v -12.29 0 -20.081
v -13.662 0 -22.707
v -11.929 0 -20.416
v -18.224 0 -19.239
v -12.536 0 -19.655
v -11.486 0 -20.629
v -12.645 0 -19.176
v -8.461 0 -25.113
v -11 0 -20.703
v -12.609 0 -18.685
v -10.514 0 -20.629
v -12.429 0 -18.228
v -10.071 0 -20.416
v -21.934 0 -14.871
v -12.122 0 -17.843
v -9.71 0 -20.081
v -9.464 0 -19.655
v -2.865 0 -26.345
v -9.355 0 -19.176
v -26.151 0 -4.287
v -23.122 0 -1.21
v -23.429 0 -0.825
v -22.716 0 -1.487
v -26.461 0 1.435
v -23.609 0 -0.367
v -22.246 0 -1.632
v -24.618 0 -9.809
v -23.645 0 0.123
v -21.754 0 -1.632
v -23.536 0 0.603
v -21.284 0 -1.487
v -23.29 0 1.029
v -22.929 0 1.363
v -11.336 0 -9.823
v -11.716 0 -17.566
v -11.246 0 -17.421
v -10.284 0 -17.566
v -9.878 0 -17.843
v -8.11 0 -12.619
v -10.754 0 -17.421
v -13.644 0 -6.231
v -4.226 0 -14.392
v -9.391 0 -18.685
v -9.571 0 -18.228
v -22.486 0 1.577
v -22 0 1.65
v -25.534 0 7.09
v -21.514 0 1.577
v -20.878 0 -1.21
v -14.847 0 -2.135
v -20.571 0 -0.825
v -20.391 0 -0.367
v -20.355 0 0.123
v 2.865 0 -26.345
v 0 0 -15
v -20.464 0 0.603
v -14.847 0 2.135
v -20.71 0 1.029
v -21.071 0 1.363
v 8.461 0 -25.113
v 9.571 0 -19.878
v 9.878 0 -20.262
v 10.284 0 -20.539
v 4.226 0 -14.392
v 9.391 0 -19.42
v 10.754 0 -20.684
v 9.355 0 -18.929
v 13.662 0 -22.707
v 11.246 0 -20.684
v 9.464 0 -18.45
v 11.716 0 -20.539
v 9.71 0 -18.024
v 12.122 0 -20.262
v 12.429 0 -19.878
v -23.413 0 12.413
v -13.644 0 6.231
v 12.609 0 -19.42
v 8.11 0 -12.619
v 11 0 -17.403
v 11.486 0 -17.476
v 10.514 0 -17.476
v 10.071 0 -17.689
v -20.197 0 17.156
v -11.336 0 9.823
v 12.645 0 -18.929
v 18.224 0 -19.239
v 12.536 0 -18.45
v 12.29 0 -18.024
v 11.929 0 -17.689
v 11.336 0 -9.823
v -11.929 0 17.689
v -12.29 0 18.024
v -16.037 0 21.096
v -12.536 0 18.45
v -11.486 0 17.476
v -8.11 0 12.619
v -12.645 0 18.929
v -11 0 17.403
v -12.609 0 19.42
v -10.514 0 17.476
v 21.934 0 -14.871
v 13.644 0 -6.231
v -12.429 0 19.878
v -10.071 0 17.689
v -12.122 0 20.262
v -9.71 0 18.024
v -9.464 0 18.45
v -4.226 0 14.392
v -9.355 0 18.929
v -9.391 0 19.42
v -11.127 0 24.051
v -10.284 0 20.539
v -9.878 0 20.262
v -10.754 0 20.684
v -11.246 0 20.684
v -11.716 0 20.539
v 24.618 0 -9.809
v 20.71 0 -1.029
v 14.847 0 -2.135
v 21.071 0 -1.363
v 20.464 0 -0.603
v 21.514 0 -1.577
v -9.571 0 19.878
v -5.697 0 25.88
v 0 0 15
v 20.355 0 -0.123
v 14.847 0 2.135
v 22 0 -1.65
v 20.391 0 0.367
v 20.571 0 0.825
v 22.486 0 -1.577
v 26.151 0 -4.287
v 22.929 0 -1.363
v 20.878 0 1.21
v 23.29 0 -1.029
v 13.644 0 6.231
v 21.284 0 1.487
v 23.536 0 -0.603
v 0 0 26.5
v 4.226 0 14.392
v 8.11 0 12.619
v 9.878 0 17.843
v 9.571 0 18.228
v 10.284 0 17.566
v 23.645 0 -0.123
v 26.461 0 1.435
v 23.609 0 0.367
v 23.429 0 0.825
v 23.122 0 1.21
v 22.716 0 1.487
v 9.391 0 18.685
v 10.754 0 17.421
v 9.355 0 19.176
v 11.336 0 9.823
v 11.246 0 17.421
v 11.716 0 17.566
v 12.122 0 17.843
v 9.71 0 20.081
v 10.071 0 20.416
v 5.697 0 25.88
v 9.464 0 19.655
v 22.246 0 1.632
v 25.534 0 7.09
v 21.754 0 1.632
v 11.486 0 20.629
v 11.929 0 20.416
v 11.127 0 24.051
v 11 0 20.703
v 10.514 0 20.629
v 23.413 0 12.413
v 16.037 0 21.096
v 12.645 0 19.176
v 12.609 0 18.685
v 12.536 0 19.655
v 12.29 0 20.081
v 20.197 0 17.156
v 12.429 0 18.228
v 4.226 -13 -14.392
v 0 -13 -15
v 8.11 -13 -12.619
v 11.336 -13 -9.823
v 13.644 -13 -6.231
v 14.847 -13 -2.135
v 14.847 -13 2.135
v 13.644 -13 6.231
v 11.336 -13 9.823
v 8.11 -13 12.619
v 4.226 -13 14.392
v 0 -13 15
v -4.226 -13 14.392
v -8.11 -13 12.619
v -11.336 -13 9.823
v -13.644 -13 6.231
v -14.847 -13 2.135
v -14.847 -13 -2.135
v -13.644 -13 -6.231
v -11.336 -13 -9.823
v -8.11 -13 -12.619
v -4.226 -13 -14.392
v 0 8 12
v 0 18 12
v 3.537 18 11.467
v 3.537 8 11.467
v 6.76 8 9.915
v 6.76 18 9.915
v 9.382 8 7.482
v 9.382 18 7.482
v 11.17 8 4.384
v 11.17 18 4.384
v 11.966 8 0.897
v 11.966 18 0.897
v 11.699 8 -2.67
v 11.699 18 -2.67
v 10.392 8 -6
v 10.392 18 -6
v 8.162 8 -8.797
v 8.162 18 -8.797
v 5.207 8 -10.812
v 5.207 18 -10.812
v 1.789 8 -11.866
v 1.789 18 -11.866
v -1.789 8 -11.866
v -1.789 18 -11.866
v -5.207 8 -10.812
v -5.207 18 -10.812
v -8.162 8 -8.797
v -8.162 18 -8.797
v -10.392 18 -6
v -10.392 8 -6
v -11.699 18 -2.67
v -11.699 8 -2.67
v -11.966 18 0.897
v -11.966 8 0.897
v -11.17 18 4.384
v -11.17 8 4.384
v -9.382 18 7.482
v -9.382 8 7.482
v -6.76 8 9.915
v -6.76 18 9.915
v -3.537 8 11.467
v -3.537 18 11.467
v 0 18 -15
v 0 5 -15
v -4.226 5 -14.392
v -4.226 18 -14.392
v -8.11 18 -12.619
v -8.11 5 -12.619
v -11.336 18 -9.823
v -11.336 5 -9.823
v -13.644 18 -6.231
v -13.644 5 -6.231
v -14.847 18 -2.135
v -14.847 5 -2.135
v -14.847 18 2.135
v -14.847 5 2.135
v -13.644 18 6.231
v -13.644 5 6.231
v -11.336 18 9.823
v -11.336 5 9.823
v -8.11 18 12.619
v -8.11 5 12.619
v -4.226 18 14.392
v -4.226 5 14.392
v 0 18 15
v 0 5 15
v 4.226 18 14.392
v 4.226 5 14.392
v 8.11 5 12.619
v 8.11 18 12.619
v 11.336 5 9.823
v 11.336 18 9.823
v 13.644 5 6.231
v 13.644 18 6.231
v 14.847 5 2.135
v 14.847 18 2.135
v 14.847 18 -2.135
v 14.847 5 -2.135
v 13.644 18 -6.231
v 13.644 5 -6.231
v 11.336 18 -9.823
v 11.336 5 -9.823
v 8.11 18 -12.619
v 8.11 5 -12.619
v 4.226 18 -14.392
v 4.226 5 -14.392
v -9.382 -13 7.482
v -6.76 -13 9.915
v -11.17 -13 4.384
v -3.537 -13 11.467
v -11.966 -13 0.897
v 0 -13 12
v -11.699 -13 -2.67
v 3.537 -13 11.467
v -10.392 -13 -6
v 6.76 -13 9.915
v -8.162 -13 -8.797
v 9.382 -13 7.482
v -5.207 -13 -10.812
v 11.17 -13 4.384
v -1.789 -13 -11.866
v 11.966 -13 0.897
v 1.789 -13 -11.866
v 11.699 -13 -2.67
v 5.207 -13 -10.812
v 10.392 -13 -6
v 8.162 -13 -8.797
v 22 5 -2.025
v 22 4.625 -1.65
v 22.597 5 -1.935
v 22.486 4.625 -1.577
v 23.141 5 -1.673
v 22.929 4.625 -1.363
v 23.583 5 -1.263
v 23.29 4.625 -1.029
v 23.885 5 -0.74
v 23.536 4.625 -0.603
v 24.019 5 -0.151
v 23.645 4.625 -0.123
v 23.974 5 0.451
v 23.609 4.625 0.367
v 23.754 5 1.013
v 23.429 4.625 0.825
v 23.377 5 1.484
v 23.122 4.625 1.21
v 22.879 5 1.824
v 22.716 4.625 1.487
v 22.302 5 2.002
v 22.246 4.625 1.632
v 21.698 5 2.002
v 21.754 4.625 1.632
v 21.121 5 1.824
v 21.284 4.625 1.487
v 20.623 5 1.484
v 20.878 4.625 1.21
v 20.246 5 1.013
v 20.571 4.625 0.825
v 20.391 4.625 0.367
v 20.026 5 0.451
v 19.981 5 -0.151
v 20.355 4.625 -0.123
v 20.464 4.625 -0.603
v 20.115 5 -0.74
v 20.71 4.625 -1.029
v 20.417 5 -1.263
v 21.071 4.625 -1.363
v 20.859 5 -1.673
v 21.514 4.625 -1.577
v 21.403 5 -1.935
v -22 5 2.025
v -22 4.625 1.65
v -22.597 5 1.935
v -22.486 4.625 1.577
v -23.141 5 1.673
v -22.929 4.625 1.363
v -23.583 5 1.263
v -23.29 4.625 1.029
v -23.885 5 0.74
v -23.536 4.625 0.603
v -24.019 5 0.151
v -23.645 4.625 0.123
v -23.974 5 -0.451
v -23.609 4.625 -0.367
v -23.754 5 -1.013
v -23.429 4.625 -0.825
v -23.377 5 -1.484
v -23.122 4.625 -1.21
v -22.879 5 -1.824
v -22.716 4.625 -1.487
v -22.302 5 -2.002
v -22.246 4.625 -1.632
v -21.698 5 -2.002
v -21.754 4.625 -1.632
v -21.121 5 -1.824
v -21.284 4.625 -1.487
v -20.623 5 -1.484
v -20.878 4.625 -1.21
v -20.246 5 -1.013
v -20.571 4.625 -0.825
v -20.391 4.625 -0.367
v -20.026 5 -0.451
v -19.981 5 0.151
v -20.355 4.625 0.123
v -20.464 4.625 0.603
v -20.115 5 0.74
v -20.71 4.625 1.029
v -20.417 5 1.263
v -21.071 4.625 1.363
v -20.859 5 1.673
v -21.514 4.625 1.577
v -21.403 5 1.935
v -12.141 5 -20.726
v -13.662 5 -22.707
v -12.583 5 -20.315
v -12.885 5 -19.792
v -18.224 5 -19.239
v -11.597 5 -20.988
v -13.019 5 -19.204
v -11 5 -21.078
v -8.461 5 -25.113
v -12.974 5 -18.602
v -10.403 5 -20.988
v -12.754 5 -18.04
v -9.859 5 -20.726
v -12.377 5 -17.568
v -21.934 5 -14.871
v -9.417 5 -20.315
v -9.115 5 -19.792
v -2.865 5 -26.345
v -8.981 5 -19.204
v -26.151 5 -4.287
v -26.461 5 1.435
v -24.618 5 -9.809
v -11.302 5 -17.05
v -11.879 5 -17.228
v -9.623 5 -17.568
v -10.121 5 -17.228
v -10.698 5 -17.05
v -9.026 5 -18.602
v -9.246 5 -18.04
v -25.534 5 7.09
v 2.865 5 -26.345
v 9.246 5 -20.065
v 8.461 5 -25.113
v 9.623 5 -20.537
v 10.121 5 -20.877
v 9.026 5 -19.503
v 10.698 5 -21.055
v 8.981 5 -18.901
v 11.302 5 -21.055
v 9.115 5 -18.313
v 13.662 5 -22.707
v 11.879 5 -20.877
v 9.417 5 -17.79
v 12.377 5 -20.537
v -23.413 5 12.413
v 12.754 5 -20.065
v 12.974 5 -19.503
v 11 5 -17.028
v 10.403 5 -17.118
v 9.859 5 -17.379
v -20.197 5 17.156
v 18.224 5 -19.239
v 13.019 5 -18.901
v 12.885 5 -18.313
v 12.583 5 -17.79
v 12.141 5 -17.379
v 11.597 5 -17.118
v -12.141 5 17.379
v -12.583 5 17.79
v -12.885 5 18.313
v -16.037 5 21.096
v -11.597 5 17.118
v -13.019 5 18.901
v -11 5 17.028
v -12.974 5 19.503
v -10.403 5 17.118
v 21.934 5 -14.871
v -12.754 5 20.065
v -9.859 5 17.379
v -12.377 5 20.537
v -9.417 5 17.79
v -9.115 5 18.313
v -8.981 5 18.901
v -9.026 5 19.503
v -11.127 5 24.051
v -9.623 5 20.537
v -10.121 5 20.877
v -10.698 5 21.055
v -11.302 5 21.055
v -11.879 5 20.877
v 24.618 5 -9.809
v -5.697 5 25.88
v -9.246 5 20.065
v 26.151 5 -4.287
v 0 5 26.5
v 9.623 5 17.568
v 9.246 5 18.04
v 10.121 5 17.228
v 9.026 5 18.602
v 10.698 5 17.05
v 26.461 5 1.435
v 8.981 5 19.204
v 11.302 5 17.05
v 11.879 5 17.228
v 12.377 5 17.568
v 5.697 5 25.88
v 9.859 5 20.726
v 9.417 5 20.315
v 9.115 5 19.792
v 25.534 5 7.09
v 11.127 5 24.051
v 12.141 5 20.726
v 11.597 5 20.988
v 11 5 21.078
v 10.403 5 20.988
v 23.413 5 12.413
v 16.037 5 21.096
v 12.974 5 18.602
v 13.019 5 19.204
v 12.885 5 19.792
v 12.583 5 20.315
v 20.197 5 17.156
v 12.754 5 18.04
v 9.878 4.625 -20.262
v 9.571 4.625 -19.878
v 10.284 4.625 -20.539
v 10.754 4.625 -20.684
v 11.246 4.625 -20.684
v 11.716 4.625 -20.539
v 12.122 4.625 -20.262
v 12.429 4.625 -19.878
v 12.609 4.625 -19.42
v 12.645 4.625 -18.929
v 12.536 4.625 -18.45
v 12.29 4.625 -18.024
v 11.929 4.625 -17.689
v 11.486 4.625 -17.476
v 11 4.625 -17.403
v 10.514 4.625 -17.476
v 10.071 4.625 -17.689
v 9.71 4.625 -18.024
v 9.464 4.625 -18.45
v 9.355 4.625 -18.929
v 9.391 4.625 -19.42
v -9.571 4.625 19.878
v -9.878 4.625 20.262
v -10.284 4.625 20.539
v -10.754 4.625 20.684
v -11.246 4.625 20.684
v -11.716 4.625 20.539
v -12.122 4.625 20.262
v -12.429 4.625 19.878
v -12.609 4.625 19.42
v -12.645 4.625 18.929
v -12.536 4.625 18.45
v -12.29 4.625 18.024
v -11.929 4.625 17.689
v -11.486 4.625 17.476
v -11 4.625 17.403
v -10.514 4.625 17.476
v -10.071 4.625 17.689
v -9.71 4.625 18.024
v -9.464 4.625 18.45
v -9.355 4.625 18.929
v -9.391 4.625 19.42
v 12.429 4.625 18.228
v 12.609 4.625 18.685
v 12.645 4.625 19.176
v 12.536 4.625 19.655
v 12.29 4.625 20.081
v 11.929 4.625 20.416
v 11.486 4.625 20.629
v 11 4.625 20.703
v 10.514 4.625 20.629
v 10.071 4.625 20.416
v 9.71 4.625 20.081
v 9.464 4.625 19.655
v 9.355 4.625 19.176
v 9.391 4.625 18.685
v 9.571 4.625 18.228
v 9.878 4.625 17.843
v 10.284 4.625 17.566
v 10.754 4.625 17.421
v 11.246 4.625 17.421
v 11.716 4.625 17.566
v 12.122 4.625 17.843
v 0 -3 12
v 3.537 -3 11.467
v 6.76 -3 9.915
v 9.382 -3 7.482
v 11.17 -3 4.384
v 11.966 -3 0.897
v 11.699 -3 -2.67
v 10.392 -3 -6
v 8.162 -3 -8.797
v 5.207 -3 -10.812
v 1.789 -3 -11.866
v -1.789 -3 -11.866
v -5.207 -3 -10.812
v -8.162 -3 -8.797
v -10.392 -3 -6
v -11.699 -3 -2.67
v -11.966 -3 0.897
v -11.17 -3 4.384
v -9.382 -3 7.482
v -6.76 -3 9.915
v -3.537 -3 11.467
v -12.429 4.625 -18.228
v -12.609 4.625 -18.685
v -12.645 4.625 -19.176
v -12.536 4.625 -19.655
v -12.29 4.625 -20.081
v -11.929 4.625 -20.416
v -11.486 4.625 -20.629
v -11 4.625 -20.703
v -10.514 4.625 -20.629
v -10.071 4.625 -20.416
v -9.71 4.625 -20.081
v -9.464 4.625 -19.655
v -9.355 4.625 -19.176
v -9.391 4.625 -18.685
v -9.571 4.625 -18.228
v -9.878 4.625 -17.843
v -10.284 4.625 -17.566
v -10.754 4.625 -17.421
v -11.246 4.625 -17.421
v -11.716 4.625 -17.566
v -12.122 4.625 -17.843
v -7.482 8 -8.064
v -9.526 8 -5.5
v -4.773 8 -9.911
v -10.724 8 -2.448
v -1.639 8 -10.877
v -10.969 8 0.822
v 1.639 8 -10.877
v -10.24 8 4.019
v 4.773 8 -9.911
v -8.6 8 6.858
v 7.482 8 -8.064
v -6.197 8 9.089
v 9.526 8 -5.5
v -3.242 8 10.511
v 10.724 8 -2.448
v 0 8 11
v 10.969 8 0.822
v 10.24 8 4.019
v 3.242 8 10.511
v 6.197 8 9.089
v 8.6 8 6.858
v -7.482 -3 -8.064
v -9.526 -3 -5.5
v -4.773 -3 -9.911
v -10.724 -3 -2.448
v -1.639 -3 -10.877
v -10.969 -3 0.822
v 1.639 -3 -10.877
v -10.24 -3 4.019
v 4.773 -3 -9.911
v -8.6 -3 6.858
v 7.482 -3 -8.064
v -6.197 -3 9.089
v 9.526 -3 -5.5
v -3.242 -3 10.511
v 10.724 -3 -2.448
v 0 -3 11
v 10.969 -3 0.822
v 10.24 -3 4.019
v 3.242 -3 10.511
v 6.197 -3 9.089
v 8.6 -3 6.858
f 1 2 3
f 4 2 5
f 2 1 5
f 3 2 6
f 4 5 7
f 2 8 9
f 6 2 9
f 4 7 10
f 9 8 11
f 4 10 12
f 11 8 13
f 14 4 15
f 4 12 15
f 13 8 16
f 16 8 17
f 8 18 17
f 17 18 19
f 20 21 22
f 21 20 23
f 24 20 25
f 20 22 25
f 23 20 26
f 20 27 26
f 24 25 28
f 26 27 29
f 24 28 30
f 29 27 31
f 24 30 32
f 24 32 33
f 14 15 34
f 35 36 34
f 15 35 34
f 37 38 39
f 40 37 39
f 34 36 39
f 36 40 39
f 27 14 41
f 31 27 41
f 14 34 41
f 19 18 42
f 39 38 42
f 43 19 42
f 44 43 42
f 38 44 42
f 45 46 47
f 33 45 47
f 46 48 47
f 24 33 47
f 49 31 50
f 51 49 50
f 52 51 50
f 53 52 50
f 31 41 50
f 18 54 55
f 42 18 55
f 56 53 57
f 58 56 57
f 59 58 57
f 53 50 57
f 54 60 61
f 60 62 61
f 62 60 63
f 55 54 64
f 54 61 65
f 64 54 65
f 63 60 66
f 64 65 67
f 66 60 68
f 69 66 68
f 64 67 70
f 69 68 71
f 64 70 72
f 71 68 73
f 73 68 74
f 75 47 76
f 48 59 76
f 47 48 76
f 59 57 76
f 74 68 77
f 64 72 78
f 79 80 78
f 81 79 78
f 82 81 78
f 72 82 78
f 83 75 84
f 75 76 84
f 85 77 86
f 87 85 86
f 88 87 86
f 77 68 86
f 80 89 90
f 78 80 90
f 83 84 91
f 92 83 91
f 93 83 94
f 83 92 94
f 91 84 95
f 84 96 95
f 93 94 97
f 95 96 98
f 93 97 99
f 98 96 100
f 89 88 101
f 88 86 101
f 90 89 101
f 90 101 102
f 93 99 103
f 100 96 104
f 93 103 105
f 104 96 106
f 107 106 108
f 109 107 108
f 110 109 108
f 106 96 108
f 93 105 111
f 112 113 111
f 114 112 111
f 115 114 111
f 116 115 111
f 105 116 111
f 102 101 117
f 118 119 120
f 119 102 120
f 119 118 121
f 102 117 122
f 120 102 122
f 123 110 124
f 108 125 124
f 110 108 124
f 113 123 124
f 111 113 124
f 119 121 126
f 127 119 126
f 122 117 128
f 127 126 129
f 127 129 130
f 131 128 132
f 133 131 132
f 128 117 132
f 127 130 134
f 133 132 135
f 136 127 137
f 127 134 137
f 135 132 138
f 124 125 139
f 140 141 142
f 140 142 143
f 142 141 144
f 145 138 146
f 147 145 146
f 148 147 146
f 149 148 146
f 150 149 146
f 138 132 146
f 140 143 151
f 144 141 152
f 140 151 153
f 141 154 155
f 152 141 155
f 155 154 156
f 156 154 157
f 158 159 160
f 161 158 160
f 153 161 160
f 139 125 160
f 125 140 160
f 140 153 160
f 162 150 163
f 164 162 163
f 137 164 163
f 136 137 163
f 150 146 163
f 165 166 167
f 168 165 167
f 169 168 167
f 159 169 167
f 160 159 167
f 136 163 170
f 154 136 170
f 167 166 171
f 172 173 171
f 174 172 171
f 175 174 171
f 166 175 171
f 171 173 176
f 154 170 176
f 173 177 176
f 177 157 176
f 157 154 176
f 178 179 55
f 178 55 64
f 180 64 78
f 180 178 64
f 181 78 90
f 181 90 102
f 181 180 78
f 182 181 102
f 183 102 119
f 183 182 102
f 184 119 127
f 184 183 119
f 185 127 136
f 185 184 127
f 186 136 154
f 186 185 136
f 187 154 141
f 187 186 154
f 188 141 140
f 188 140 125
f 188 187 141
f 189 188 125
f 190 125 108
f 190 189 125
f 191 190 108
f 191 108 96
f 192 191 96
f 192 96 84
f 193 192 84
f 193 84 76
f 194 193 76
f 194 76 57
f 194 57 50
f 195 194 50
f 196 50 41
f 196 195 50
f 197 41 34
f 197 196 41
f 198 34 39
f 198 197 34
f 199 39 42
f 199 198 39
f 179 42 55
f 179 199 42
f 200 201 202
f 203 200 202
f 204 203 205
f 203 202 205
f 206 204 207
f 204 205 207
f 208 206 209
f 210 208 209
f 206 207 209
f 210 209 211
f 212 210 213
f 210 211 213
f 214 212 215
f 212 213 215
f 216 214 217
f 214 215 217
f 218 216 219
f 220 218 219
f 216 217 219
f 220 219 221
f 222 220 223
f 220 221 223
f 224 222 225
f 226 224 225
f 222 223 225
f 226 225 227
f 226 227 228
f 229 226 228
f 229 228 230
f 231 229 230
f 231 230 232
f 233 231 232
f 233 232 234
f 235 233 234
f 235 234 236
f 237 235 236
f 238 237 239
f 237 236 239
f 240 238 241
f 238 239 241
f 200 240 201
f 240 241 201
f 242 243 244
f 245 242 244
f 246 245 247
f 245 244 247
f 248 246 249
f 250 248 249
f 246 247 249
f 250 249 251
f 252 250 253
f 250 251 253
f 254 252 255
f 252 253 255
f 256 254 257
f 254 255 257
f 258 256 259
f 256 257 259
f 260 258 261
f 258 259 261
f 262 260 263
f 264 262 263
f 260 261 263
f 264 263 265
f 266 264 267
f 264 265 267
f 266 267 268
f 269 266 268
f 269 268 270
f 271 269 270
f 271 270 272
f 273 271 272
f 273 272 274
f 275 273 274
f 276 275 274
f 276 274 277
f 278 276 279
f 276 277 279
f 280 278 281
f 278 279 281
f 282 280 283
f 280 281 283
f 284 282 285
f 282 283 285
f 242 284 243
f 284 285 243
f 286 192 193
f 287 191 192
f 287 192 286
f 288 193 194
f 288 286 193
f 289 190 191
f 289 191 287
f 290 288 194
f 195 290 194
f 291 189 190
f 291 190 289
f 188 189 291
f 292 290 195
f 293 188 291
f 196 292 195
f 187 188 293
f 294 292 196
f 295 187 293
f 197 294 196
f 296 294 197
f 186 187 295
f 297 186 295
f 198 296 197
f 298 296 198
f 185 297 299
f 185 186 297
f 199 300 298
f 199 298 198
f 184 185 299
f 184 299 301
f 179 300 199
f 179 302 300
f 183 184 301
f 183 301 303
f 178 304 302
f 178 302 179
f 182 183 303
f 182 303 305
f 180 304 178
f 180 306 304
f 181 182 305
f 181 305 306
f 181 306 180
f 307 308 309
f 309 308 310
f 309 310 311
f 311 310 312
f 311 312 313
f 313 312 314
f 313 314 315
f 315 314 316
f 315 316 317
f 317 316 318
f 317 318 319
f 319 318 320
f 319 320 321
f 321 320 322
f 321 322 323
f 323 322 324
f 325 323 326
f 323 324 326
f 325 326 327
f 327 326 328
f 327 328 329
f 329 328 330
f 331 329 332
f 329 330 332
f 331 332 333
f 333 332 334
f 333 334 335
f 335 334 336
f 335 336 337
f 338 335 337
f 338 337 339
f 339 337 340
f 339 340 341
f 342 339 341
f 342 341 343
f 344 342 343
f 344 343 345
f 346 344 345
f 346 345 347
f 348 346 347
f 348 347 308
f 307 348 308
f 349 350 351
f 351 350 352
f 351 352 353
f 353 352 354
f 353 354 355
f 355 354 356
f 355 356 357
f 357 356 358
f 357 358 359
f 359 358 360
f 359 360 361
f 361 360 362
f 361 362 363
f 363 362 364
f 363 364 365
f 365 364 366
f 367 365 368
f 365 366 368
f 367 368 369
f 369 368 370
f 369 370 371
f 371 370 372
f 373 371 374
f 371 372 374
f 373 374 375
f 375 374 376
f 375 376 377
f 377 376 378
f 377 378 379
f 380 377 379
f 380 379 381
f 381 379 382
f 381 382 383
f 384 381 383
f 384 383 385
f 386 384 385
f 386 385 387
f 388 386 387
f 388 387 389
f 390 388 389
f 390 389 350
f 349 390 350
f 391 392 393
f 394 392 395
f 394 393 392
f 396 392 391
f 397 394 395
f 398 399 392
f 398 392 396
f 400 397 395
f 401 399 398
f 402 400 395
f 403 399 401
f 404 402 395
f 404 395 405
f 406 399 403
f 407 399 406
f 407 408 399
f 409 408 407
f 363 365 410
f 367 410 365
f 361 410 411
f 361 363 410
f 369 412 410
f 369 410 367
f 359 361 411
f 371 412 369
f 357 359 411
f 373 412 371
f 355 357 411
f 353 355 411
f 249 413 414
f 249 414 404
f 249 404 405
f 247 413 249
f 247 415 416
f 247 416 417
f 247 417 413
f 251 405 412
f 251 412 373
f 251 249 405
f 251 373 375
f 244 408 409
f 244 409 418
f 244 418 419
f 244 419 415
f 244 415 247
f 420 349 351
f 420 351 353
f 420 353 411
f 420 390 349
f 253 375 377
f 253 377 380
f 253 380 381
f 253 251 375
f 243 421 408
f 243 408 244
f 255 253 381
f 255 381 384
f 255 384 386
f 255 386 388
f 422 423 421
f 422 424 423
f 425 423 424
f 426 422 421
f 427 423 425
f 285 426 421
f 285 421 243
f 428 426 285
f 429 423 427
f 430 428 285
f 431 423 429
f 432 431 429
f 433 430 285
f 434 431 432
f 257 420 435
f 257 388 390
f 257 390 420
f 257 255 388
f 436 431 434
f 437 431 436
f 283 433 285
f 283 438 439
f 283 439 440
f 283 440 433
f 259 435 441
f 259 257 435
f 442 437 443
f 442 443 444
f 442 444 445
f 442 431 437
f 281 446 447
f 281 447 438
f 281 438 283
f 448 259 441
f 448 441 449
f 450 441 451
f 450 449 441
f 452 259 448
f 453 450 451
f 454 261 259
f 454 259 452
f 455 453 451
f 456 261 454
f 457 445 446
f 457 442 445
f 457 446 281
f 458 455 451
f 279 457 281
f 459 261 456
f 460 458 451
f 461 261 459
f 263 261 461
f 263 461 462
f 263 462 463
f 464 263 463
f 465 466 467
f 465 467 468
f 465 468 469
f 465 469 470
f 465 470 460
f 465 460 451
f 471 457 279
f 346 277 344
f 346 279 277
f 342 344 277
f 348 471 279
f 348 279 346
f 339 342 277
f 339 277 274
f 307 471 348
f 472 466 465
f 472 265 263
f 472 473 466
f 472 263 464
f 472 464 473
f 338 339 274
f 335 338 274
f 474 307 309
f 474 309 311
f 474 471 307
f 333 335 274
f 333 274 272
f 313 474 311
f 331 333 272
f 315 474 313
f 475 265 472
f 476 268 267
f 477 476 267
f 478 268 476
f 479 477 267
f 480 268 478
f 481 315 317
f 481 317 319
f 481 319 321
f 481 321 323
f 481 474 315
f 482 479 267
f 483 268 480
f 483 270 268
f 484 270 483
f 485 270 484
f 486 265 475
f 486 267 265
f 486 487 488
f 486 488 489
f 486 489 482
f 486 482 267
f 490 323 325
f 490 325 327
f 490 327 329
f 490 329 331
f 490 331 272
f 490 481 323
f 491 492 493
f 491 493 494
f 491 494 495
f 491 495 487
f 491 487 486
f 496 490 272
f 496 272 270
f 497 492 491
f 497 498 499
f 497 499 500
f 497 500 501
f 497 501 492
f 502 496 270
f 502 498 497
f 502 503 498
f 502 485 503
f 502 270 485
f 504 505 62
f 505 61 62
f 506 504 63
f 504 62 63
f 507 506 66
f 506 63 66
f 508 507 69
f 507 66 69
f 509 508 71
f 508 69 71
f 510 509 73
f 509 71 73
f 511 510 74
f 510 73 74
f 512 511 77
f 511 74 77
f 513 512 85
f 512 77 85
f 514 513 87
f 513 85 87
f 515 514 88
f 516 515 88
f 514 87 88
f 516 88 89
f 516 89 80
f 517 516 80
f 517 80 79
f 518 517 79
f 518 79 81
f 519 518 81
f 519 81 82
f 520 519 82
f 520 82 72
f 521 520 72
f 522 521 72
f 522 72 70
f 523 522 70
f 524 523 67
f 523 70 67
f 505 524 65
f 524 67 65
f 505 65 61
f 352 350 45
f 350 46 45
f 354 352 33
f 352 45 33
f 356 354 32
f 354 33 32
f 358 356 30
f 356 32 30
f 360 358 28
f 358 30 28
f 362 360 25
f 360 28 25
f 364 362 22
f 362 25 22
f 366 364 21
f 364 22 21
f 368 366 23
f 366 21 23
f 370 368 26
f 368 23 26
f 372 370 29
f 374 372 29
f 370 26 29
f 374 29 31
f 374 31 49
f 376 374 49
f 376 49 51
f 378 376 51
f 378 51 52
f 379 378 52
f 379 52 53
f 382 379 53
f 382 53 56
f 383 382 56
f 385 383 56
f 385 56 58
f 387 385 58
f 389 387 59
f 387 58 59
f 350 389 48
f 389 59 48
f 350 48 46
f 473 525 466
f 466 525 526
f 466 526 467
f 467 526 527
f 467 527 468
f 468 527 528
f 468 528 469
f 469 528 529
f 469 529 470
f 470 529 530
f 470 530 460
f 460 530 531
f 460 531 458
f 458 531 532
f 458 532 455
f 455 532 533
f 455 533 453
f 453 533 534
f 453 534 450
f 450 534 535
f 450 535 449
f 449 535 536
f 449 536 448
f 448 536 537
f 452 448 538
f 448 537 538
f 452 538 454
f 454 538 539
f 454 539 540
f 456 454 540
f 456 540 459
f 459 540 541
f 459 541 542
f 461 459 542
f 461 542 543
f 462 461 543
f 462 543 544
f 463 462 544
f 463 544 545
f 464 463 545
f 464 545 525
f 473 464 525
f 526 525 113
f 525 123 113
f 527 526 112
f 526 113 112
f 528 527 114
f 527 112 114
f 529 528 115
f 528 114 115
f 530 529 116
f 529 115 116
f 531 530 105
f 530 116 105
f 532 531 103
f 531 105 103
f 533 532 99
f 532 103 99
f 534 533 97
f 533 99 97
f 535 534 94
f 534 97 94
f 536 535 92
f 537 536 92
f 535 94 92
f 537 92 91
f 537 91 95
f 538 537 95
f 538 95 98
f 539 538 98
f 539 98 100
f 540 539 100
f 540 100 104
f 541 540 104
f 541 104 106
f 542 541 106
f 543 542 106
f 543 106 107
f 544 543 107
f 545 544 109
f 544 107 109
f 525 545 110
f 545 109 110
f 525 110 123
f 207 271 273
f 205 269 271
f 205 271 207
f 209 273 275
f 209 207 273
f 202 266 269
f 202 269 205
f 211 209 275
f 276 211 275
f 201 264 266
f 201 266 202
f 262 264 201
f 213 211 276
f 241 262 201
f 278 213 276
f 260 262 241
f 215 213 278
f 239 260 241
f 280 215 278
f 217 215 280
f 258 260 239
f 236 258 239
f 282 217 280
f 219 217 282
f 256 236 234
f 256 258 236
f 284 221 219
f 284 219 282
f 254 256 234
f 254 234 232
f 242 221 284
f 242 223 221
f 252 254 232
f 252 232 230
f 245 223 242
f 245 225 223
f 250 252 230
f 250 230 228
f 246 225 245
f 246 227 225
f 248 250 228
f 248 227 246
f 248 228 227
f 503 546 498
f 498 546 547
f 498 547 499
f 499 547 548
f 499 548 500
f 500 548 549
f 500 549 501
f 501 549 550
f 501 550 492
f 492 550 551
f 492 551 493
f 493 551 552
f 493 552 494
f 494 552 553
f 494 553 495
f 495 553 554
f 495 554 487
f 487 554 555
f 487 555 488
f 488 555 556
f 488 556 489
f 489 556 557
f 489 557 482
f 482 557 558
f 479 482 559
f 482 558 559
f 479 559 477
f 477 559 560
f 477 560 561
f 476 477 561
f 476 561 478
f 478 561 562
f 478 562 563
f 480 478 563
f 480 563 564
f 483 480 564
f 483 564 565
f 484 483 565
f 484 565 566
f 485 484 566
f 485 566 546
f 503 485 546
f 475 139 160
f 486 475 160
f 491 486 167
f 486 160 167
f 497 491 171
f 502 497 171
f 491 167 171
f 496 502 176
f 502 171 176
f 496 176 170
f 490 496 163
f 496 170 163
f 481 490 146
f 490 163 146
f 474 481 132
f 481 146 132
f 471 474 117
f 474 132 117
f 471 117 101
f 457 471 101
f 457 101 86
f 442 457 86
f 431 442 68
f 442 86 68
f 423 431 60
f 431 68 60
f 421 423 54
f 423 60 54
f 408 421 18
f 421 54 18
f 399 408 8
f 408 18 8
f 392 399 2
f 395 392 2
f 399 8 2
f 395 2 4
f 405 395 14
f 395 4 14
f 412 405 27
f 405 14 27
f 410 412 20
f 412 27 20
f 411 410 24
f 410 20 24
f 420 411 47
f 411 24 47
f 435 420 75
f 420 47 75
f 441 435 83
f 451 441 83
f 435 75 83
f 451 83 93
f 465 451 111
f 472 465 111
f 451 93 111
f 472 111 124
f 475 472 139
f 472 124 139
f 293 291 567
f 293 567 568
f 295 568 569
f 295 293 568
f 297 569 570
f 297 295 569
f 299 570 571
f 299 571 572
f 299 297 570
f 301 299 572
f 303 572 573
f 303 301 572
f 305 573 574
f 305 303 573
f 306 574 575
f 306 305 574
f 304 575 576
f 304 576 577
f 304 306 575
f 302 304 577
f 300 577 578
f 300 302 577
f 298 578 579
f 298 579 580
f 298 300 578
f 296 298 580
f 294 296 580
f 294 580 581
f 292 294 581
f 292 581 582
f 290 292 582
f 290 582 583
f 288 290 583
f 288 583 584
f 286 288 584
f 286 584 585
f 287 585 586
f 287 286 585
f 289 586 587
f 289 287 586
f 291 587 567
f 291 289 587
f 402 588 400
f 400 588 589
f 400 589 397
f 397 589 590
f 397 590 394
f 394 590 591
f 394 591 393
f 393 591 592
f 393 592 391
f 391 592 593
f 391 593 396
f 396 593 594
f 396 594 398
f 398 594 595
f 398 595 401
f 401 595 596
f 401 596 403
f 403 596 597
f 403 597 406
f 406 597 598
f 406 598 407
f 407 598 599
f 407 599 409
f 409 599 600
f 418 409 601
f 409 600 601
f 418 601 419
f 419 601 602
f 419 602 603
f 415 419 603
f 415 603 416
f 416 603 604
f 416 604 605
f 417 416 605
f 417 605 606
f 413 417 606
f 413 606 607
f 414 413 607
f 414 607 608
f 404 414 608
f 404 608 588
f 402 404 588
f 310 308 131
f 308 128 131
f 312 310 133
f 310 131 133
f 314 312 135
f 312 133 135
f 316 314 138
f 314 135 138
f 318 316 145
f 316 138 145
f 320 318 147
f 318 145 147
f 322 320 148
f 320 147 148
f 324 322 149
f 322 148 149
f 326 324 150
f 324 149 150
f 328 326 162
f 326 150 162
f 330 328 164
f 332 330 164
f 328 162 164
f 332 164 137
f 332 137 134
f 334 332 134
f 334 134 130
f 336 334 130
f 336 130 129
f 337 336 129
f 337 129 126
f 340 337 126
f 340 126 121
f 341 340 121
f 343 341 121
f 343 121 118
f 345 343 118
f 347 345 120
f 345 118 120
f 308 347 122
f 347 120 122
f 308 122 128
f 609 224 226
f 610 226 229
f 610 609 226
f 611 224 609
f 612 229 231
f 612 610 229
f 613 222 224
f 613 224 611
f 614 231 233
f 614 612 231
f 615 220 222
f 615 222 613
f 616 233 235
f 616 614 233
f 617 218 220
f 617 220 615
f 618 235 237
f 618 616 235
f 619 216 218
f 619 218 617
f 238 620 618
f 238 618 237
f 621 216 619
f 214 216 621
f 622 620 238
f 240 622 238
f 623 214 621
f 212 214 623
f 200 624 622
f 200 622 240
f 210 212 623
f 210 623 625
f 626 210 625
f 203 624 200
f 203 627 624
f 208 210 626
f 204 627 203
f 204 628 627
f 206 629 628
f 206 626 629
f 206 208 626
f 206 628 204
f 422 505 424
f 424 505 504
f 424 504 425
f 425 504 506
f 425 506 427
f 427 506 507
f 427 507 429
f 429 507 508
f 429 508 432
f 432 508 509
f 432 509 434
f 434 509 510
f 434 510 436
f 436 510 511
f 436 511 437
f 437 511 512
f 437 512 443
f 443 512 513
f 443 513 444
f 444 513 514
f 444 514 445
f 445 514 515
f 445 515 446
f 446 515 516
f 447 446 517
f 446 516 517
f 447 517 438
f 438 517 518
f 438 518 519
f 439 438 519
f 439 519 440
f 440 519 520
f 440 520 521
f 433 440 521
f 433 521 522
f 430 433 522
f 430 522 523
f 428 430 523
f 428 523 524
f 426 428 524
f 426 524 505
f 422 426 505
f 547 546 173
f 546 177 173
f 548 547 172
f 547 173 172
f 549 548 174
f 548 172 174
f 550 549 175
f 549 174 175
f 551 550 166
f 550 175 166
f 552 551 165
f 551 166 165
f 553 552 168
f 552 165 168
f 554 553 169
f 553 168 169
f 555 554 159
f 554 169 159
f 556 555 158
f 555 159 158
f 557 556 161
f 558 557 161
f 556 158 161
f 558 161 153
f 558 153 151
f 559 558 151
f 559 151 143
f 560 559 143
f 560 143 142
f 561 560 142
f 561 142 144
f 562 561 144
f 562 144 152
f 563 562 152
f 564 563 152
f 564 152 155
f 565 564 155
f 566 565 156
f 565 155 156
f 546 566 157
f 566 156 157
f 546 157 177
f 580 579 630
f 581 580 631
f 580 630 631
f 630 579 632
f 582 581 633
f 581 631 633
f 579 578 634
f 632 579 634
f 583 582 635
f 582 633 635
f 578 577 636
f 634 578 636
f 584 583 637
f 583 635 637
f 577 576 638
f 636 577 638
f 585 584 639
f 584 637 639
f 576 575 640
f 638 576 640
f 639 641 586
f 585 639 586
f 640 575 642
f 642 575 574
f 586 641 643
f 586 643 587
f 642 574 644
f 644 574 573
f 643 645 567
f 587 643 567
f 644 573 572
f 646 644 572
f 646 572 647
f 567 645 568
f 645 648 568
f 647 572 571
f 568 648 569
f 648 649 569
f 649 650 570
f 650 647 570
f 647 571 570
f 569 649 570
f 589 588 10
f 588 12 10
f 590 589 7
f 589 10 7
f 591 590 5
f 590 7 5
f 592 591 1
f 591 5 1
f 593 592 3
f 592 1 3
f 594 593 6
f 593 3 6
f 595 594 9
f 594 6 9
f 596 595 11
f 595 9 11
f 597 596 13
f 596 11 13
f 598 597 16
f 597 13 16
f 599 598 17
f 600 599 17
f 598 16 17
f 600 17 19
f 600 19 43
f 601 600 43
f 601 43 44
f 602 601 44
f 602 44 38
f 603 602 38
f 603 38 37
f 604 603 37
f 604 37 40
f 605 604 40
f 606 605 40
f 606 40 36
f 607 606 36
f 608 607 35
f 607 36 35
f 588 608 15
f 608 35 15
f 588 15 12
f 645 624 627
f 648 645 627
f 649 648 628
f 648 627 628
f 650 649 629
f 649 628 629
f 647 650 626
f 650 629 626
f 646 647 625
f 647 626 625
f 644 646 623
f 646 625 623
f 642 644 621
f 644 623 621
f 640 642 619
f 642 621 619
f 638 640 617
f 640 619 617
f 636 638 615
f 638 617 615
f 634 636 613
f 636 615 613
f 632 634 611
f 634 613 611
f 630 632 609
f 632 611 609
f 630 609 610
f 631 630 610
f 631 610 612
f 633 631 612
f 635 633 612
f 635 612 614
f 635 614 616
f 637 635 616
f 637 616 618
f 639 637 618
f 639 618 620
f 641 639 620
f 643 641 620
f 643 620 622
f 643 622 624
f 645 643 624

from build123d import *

# Parameters (mm, degrees)
SKETCH_1_R                   = 26.5
EXTRUDE_2_DEPTH              = 5
SKETCH_3_R                   = 15
EXTRUDE_3_DEPTH              = 13
EXTRUDE_START                = 13
SKETCH_4_R                   = 15
EXTRUDE_4_DEPTH              = 13
HOLE_WIZARD_M4_1_D           = 3.3
HOLE_WIZARD_M4_1_CSINK_D     = 4.05
HOLE_WIZARD_M4_1_CSINK_ANGLE = 90
PATTERN_CIRCULAR_1_COUNT     = 6
SKETCH_7_R                   = 11
CUT_EXTRUDE_1_DEPTH          = 31
SKETCH_8_R                   = 12
CUT_EXTRUDE_2_DEPTH          = 10


with BuildPart() as part:
    # 草图1 → 凸台-拉伸2 (new body)
    with BuildSketch(Plane(origin=(0, 0, 0), x_dir=(1, 0, 0), z_dir=(0, 1, 0))):
        with Locations(Location((0, 0, 0), (0, 0, 270))):
            Circle(SKETCH_1_R)
    extrude(amount=EXTRUDE_2_DEPTH)

    # 草图3 → 凸台-拉伸3 (add)
    with BuildSketch(Plane(origin=(0, 5, 0), x_dir=(1, 0, 0), z_dir=(0, 1, 0))):
        with Locations(Location((0, 0, 0), (0, 0, 90))):
            Circle(SKETCH_3_R)
    extrude(amount=EXTRUDE_3_DEPTH)

    # 草图4 → 凸台-拉伸4 (add)
    with BuildSketch(Plane.XZ.offset(EXTRUDE_START)):
        with Locations(Location((0, 0, 0), (0, 0, 270))):
            Circle(SKETCH_4_R)
    extrude(amount=-EXTRUDE_4_DEPTH)

    # M4 螺纹孔1 (through all)
    with Locations(Plane(origin=(22, 5, 0), x_dir=(0, 0, 1), z_dir=(0, 1, 0))):
        with Locations((0, 0)):
            hole_wizard_m4_1 = CounterSinkHole(HOLE_WIZARD_M4_1_D / 2, HOLE_WIZARD_M4_1_CSINK_D / 2, counter_sink_angle=HOLE_WIZARD_M4_1_CSINK_ANGLE)

    # 阵列(圆周)1: M4 螺纹孔1 ×6 about axis
    pattern_circular_1_axis = Axis((0, 0, 0), (0, 1, 0))
    for i in range(1, PATTERN_CIRCULAR_1_COUNT):
        add(hole_wizard_m4_1.rotate(pattern_circular_1_axis, i * 360 / PATTERN_CIRCULAR_1_COUNT), mode=Mode.SUBTRACT)

    # 草图7 → 切除-拉伸1 (cut)
    with BuildSketch(Plane(origin=(0, 18, 0), x_dir=(1, 0, 0), z_dir=(0, 1, 0))):
        with Locations(Location((0, 0, 0), (0, 0, 270))):
            Circle(SKETCH_7_R)
    extrude(amount=-CUT_EXTRUDE_1_DEPTH, mode=Mode.SUBTRACT)

    # 草图8 → 切除-拉伸2 (cut)
    with BuildSketch(Plane(origin=(0, 18, 0), x_dir=(1, 0, 0), z_dir=(0, 1, 0))):
        with Locations(Location((0, 0, 0), (0, 0, 270))):
            Circle(SKETCH_8_R)
    cut_extrude_2 = extrude(amount=-CUT_EXTRUDE_2_DEPTH, mode=Mode.SUBTRACT)

    # 镜向1: 切除-拉伸2 across plane
    add(cut_extrude_2.mirror(Plane.ZX.offset(2.5)), mode=Mode.SUBTRACT)


solid = part.part
